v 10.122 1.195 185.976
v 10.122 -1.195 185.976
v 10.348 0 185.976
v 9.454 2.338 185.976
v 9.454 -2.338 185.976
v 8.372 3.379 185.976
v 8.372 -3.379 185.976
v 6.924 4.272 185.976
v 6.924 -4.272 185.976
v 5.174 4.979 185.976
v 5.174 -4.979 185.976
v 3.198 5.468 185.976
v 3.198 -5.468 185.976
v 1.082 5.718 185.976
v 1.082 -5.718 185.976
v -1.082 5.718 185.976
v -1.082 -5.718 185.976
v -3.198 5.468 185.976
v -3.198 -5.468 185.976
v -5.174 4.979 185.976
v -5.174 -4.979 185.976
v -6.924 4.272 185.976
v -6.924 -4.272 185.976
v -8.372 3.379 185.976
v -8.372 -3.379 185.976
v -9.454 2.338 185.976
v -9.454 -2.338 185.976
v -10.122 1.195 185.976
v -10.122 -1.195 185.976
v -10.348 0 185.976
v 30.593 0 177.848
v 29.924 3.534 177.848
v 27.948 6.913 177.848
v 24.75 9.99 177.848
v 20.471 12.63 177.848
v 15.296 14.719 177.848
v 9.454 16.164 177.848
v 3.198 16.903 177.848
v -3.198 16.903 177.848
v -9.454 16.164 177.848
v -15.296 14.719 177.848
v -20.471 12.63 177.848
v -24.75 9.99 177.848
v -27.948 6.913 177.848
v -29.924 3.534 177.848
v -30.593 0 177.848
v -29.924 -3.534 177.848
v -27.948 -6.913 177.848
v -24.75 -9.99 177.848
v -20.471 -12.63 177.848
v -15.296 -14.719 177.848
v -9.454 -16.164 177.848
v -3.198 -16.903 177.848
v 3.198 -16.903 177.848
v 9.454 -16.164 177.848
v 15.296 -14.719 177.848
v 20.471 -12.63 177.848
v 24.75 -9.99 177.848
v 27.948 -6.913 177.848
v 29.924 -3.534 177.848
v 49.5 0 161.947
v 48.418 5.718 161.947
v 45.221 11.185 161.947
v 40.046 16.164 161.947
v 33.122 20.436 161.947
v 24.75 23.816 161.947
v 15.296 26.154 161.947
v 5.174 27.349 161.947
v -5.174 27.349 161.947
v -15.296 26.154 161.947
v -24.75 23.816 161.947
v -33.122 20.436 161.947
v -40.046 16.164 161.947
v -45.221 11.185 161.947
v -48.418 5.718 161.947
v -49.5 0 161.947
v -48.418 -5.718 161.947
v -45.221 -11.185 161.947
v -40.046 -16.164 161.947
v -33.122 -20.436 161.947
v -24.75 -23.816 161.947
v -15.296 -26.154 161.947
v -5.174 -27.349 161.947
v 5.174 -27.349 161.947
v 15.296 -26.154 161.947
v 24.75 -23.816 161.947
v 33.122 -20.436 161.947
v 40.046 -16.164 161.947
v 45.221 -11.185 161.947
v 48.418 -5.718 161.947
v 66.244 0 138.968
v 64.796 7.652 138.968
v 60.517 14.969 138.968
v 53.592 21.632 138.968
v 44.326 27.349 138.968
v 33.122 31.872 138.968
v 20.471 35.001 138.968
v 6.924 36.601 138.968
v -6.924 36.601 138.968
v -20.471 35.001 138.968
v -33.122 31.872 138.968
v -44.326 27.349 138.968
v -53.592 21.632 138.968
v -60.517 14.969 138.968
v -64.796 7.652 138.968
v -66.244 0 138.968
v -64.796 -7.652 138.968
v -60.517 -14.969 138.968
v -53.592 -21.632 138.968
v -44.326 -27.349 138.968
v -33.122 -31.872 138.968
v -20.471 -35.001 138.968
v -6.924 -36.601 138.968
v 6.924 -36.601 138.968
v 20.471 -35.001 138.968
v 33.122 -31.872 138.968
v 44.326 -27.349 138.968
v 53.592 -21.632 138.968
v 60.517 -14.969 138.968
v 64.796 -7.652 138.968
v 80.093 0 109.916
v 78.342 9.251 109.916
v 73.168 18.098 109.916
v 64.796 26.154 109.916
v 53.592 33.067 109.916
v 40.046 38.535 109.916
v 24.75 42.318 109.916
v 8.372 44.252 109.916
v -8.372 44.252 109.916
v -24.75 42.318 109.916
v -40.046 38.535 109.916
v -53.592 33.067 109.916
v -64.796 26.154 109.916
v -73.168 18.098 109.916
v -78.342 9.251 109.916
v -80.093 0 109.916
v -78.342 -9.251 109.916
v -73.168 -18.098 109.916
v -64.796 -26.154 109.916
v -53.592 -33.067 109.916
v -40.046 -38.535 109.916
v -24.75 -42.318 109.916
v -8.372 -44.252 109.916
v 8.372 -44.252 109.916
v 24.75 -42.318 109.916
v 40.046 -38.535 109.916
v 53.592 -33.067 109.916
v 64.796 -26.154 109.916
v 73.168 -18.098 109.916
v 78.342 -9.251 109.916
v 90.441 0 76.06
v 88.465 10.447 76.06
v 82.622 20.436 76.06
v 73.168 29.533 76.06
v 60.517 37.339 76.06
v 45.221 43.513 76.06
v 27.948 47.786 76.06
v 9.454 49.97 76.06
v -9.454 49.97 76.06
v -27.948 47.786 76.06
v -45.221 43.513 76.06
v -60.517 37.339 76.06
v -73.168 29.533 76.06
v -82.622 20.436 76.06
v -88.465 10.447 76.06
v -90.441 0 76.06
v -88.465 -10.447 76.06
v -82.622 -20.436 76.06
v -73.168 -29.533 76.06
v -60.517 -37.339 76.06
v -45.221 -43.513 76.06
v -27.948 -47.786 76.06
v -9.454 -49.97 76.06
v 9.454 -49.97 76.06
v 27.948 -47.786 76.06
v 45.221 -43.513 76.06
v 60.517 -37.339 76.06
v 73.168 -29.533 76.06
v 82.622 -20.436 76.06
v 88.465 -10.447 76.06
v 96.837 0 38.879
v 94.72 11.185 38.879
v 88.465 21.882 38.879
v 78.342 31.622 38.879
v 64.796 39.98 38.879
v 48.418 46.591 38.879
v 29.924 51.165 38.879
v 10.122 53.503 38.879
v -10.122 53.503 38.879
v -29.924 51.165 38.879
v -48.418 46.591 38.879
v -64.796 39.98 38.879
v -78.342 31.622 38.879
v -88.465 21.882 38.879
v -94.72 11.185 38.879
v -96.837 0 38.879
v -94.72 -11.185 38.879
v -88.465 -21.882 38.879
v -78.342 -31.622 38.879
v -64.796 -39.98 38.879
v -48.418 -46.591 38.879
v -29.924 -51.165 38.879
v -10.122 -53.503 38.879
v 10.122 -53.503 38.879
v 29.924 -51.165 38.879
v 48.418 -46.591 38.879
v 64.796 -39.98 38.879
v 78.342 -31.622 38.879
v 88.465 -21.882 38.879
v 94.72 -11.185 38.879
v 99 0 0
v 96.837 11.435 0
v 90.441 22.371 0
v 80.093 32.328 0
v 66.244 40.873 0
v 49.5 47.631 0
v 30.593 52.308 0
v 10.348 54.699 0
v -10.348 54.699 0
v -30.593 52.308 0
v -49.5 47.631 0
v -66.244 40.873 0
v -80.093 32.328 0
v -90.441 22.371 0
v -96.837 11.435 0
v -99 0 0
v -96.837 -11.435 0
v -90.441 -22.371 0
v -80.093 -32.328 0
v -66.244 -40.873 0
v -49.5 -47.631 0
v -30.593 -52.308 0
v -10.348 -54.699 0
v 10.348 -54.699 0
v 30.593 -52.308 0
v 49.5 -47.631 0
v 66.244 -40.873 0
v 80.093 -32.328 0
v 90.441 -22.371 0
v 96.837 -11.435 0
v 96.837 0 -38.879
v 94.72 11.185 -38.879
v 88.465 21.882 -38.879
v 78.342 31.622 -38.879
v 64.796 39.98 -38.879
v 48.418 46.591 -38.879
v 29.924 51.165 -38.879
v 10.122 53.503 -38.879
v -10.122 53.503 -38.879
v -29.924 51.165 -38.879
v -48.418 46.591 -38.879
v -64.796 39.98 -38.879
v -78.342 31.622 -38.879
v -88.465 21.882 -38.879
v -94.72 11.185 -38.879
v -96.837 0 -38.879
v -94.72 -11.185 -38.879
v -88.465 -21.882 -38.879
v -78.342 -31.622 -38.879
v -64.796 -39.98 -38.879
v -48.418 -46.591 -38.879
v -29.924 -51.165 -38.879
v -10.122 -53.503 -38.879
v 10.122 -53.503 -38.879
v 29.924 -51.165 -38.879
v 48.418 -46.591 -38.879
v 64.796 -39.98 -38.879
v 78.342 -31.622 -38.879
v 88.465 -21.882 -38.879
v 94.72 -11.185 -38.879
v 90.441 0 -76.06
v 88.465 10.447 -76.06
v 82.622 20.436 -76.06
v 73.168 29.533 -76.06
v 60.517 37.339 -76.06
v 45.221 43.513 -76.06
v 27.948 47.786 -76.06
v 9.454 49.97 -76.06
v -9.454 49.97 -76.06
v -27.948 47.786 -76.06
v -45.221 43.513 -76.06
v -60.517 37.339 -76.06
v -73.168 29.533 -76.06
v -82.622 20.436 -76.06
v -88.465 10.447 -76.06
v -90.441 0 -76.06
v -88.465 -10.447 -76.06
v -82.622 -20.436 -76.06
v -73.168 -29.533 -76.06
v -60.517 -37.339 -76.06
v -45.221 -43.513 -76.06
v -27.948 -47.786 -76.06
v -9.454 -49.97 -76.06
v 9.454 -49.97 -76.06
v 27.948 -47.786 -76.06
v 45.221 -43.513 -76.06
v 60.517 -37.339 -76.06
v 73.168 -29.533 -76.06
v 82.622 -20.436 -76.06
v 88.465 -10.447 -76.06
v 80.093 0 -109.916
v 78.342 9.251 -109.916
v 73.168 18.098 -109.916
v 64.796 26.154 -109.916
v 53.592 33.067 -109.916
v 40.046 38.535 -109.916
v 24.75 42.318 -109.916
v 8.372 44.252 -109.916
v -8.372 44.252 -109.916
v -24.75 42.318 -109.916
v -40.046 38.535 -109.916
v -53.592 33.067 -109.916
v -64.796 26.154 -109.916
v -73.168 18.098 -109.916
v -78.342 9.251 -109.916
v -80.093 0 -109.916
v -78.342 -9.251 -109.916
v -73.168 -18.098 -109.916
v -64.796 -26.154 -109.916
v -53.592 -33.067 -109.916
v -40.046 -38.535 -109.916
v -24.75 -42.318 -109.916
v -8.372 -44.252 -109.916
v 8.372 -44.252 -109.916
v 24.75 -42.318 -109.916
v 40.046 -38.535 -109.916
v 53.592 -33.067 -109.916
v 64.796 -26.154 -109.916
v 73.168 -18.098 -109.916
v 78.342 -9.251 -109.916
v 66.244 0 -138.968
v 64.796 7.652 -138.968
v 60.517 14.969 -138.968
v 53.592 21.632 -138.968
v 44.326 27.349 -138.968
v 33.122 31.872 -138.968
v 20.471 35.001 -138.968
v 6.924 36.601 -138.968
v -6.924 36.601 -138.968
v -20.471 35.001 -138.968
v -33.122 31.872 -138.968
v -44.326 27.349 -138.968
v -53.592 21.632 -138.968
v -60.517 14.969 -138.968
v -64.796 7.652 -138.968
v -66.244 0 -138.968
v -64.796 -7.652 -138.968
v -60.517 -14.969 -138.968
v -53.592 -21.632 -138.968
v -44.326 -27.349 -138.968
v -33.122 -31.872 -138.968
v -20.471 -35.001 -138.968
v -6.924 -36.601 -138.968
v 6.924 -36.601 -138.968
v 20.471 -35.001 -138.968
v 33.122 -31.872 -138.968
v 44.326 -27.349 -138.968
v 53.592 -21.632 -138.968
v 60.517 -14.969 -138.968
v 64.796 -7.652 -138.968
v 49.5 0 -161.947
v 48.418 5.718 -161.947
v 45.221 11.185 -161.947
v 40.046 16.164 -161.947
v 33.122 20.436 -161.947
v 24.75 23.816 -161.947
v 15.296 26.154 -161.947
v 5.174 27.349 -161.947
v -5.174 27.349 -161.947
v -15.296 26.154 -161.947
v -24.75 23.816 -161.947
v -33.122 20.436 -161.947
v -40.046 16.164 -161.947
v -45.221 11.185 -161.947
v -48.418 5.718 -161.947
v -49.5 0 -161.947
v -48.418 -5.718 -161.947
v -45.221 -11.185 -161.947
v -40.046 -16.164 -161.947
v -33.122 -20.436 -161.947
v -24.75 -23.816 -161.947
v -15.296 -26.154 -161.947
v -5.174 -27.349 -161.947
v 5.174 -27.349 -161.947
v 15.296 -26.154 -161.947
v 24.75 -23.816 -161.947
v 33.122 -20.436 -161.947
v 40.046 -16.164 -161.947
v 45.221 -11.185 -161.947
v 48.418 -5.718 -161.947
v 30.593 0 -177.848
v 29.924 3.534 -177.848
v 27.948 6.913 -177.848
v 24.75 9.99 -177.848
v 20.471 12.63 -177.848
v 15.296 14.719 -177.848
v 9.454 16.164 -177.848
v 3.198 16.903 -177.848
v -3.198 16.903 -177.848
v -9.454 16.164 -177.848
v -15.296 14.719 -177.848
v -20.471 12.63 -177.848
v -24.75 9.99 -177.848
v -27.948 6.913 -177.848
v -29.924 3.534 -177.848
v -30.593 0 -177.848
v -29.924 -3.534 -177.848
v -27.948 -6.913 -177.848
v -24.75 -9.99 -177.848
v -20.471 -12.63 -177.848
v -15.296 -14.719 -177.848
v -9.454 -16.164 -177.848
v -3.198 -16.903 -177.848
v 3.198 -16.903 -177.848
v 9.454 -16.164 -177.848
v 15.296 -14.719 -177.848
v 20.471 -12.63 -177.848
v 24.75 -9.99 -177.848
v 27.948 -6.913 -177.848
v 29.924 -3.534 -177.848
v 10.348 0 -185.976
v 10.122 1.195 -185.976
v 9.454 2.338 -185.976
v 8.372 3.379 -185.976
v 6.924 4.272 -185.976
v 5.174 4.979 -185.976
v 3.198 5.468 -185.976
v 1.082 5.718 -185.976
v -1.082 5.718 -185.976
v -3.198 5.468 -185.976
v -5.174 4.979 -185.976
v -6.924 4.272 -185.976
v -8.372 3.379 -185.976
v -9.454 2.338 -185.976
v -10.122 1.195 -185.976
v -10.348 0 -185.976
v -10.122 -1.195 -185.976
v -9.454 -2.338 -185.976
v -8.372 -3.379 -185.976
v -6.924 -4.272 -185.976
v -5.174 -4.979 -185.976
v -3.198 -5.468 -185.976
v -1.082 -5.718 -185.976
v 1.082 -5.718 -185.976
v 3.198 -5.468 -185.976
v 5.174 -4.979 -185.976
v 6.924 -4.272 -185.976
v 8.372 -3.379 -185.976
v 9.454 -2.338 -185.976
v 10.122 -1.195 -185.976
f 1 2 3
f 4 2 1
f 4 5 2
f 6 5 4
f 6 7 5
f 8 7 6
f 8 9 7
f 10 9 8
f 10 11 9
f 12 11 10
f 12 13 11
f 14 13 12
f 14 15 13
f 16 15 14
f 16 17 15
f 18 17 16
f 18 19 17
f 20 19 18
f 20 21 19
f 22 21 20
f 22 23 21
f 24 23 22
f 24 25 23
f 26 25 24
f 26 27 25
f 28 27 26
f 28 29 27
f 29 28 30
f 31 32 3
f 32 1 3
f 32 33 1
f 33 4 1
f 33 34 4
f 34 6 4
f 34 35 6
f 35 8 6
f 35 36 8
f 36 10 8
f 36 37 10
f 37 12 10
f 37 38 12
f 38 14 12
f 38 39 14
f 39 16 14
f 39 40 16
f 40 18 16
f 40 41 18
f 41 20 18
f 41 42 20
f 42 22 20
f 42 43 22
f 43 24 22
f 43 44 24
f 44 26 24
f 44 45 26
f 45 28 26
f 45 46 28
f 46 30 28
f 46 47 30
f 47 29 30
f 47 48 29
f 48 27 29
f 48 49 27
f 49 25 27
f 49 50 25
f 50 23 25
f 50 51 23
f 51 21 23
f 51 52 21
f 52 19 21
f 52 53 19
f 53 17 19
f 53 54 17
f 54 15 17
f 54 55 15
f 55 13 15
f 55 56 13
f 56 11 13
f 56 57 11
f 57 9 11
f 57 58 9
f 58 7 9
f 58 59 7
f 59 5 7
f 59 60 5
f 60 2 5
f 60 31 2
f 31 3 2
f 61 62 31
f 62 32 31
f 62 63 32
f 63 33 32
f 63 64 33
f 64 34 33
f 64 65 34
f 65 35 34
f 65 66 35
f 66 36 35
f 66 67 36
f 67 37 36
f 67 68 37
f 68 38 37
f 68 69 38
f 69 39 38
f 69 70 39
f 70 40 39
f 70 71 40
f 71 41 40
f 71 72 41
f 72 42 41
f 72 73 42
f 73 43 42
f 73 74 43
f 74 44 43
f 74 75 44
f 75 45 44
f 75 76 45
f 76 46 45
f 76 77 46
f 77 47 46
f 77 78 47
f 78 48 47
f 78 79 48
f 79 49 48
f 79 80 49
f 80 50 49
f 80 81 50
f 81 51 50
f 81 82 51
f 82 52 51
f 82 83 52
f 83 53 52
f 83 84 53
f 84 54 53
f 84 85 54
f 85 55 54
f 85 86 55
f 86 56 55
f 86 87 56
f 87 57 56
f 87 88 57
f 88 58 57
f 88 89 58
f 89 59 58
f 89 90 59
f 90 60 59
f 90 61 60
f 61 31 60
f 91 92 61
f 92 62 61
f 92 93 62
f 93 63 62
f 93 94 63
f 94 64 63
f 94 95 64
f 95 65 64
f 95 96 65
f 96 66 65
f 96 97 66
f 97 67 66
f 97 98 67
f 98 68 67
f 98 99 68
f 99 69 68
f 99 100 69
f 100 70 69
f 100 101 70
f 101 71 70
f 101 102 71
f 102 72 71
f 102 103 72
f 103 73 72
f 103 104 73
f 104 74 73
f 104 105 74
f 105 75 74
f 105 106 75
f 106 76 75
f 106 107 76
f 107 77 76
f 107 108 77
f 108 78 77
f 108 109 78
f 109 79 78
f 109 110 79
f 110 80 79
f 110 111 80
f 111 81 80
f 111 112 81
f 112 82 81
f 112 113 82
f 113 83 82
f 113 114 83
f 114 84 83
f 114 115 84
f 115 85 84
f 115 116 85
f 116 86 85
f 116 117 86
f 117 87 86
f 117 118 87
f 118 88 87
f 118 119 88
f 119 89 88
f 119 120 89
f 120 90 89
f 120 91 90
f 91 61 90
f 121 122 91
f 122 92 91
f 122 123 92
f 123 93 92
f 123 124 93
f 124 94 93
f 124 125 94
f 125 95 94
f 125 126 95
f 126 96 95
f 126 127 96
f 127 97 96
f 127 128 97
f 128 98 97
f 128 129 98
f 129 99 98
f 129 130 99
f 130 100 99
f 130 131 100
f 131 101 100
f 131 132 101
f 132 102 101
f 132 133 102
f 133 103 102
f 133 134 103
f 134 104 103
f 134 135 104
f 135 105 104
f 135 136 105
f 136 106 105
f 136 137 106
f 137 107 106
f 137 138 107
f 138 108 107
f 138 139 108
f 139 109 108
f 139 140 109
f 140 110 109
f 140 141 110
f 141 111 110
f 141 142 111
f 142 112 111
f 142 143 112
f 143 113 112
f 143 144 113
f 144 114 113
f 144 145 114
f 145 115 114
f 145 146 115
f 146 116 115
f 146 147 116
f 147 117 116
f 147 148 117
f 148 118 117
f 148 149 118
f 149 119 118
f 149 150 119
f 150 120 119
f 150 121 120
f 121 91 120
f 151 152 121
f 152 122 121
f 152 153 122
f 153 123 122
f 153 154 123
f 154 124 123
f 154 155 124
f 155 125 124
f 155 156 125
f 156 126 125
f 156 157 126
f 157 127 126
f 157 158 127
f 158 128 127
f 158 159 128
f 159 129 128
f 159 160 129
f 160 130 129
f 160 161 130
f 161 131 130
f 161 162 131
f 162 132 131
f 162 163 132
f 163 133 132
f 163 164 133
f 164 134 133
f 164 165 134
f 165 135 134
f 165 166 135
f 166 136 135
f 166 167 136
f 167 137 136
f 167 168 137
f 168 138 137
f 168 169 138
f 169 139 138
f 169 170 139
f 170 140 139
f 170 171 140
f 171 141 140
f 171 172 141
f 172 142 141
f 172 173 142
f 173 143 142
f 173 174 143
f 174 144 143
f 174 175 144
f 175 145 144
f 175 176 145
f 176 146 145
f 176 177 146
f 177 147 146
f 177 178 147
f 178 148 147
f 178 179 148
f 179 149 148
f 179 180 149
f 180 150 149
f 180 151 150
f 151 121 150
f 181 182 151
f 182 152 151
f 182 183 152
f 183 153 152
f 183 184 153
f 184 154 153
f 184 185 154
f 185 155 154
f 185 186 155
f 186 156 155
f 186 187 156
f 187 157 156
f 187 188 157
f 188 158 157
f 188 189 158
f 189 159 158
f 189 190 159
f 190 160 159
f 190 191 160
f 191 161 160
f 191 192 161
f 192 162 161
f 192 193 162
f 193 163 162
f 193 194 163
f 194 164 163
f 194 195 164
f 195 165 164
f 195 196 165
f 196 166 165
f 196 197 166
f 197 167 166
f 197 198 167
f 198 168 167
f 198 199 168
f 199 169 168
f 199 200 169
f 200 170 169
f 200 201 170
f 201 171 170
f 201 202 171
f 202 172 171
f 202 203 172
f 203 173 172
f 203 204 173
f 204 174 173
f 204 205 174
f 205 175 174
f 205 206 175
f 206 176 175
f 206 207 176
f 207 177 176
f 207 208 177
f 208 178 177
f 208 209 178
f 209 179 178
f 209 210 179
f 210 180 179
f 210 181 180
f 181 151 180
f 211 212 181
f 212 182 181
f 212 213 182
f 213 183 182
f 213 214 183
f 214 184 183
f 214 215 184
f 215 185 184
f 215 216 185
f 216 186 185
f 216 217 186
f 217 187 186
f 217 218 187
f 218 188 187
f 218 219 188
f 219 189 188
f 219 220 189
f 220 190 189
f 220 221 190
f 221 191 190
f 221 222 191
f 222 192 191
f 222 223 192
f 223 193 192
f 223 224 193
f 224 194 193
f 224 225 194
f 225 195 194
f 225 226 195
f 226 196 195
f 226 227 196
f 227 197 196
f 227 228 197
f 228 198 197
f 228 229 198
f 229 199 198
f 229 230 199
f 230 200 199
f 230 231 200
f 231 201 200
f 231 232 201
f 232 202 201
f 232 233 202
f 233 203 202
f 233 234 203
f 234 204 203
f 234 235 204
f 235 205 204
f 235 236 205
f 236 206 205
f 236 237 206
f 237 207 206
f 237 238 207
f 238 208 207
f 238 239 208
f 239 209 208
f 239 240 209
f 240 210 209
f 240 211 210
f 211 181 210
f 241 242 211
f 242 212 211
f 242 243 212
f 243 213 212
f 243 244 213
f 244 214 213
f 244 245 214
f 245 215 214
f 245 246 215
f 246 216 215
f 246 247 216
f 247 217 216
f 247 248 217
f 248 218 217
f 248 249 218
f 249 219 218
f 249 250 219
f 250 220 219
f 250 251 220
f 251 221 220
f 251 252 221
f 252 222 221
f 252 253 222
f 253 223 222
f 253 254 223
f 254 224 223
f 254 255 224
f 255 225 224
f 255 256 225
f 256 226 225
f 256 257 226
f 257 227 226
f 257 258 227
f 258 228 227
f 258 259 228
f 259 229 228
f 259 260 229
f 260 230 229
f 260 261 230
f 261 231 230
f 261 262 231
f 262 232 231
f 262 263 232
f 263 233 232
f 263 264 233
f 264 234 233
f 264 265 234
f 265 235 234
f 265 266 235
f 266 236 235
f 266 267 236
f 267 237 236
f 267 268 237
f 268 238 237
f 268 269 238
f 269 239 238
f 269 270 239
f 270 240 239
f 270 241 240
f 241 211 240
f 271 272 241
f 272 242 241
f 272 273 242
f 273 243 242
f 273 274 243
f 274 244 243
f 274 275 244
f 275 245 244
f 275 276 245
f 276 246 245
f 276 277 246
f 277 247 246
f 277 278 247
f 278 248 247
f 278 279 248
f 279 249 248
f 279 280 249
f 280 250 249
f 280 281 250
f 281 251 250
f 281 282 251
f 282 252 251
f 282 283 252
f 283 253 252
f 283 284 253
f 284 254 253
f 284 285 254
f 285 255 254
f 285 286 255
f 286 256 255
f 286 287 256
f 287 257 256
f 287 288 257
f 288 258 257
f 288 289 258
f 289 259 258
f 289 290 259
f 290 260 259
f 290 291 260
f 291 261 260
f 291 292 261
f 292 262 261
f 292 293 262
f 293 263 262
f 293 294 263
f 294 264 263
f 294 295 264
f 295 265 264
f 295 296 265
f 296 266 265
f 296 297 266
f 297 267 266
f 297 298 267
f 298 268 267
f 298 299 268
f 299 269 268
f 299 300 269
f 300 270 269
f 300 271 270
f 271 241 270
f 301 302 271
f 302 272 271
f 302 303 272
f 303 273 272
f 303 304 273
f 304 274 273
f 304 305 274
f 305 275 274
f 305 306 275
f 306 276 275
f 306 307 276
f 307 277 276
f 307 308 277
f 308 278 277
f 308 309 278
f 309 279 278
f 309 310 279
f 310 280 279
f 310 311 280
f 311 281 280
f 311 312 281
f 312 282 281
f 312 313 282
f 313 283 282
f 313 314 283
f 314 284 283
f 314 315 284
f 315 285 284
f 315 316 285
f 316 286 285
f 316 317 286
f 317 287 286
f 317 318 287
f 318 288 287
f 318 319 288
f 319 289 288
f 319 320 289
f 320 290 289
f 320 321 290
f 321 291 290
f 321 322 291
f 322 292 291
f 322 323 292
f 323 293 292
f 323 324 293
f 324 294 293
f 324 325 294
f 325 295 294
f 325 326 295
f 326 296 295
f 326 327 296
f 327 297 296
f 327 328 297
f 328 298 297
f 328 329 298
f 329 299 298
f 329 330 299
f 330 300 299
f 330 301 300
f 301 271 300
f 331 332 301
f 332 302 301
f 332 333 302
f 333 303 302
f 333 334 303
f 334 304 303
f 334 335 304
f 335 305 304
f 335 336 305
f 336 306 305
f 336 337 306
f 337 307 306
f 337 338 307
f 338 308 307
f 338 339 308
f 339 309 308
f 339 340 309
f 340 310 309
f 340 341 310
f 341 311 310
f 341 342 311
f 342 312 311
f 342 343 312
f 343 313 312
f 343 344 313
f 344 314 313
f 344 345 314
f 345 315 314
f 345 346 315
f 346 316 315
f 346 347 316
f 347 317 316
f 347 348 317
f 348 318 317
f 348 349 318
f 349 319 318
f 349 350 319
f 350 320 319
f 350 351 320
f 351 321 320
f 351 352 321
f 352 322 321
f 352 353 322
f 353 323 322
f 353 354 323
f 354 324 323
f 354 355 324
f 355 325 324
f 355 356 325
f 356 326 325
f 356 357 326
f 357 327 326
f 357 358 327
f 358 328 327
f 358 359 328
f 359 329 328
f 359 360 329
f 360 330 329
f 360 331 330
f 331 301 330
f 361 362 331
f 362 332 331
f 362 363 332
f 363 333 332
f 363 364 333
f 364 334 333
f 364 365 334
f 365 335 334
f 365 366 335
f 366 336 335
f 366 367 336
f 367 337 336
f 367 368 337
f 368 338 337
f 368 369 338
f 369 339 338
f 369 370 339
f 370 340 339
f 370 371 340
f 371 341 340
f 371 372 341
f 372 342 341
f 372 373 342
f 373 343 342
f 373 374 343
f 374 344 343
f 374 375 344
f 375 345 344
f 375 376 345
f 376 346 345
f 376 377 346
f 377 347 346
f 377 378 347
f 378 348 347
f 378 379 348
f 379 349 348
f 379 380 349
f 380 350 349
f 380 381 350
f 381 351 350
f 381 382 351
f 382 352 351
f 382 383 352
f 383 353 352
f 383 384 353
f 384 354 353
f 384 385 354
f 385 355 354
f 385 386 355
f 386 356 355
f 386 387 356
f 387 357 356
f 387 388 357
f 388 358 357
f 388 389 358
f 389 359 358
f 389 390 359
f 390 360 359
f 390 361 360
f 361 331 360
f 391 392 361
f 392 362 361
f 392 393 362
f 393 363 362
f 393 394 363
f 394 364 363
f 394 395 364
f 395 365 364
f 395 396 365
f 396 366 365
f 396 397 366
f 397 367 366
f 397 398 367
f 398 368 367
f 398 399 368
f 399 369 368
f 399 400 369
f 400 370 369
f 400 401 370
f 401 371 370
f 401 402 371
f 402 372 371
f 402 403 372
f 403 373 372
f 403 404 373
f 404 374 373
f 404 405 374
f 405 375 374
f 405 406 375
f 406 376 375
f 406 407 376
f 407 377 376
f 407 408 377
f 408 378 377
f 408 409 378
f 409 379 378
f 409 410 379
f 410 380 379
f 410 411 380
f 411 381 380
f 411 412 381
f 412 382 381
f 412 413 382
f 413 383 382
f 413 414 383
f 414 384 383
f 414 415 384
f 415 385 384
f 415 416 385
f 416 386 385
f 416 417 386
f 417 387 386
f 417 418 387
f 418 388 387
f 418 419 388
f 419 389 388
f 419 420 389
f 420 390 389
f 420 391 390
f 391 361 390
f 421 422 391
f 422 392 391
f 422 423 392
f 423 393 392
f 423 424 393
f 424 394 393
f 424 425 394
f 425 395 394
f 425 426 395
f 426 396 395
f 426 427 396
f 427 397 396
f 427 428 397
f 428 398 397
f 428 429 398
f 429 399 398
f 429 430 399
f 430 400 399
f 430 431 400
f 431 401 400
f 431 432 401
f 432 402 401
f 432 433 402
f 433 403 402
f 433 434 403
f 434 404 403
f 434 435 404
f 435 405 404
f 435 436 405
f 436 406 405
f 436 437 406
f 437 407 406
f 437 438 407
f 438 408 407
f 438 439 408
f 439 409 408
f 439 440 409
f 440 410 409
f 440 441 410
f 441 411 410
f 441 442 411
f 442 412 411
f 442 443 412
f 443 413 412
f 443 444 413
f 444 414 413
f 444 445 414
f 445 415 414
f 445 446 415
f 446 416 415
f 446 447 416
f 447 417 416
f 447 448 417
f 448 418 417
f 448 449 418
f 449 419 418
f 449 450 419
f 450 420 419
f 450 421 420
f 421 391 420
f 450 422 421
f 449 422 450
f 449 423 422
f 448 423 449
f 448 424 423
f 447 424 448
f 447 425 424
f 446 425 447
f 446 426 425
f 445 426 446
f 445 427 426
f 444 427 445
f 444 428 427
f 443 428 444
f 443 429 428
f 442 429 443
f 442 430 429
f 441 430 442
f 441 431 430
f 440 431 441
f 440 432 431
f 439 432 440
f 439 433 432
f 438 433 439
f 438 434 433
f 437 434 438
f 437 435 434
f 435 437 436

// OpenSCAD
// Generated by SolidPython 1.0.1 on 2020-07-29 00:46:48


scale(v = [9, 5, 17]) {
	sphere(r = 11);
}
/***********************************************
*********      SolidPython code:      **********
************************************************
 
# import packages: SolidPython
from solid import *
from solid.utils import *
from itertools import chain, combinations, permutations


class Resize:

    def __init__(self, scad_file):
        self.scad_file = scad_file
        #self.scad_file = import_scad(scad_file)
        # cone/cylinder param:
        self.r1 = 0
        self.r2 = 0
        self.h = 0
        # rectangular prism param:
        self.w = 0
        self.l = 0
        # ellipse param:
        self.r = 0

    # import OpenScad code (file name corresponds to shape)


    # classify shape + parameters
    def assign(self, param1, param2, param3):
        if self.scad_file == 'cone.scad':
            self.r1 = param1
            self.r2 = param2
            self.h = param3
        elif self.scad_file == 'cylinder.scad':
            self.r1 = param1
            self.r2 = param2
            self.h = param3
        elif self.scad_file == 'rectangularPrism.scad':
            self.h = param1
            self.l = param2
            self.w = param3
        else:
            self.r = param1
            self.h = param2

    # resize parameters
    def iterate(self):
        x = range(3, 20, 2)
        i = 1
        if self.scad_file == 'cone.scad':
            tempList = list(permutations(x, 2))
            for temp in tempList:
                param1 = temp[0]
                param2 = temp[1]
                filepath = 'produced_scad_files/' + 'cone' + str(param1) + '_' + str(param2) + '_' + '.scad'
                scad_render_to_file(cylinder(h=param1, r1=param2, r2=0), filepath)

        elif self.scad_file == 'cylinder.scad':
            tempList = list(permutations(x, 3))
            for temp in tempList:
                param1 = temp[0]
                param2 = temp[1]
                filepath = 'produced_scad_files/' + 'cylinder' + str(param1) + '_' + str(param2) + '_' + '.scad'
                scad_render_to_file(cylinder(h=param1, r1=param2, r2=param2), filepath)

        elif self.scad_file == 'rectangularPrism.scad':
            tempList = list(permutations(x, 3))
            for temp in tempList:
                param1 = temp[0]
                param2 = temp[1]
                param3 = temp[2]
                filepath = 'produced_scad_files/' + 'rectangularPrism' + str(param1) + '_' + str(param2) + '_' + str(
                    param3) + '.scad'
                scad_render_to_file(cube(size=(param1, param2, param3)), filepath)

        elif self.scad_file == 'ellipse.scad':
            tempList = list(permutations(x, 4))
            for temp in tempList:
                param1 = temp[0]
                param2 = temp[1]
                param3 = temp[2]
                param4 = temp[3]
                filepath = 'produced_scad_files/' + 'ellipse' + str(param1) + '_' + str(param2) + '_' + str(param3) + '_' + str(param4) + '.scad'
                scad_render_to_file(scale([param1, param2, param3])(sphere(r=param4)), filepath)

    def render_to_scadfile(self):
        scad_render_to_file(scad, 'example.scad') 
 
************************************************/
